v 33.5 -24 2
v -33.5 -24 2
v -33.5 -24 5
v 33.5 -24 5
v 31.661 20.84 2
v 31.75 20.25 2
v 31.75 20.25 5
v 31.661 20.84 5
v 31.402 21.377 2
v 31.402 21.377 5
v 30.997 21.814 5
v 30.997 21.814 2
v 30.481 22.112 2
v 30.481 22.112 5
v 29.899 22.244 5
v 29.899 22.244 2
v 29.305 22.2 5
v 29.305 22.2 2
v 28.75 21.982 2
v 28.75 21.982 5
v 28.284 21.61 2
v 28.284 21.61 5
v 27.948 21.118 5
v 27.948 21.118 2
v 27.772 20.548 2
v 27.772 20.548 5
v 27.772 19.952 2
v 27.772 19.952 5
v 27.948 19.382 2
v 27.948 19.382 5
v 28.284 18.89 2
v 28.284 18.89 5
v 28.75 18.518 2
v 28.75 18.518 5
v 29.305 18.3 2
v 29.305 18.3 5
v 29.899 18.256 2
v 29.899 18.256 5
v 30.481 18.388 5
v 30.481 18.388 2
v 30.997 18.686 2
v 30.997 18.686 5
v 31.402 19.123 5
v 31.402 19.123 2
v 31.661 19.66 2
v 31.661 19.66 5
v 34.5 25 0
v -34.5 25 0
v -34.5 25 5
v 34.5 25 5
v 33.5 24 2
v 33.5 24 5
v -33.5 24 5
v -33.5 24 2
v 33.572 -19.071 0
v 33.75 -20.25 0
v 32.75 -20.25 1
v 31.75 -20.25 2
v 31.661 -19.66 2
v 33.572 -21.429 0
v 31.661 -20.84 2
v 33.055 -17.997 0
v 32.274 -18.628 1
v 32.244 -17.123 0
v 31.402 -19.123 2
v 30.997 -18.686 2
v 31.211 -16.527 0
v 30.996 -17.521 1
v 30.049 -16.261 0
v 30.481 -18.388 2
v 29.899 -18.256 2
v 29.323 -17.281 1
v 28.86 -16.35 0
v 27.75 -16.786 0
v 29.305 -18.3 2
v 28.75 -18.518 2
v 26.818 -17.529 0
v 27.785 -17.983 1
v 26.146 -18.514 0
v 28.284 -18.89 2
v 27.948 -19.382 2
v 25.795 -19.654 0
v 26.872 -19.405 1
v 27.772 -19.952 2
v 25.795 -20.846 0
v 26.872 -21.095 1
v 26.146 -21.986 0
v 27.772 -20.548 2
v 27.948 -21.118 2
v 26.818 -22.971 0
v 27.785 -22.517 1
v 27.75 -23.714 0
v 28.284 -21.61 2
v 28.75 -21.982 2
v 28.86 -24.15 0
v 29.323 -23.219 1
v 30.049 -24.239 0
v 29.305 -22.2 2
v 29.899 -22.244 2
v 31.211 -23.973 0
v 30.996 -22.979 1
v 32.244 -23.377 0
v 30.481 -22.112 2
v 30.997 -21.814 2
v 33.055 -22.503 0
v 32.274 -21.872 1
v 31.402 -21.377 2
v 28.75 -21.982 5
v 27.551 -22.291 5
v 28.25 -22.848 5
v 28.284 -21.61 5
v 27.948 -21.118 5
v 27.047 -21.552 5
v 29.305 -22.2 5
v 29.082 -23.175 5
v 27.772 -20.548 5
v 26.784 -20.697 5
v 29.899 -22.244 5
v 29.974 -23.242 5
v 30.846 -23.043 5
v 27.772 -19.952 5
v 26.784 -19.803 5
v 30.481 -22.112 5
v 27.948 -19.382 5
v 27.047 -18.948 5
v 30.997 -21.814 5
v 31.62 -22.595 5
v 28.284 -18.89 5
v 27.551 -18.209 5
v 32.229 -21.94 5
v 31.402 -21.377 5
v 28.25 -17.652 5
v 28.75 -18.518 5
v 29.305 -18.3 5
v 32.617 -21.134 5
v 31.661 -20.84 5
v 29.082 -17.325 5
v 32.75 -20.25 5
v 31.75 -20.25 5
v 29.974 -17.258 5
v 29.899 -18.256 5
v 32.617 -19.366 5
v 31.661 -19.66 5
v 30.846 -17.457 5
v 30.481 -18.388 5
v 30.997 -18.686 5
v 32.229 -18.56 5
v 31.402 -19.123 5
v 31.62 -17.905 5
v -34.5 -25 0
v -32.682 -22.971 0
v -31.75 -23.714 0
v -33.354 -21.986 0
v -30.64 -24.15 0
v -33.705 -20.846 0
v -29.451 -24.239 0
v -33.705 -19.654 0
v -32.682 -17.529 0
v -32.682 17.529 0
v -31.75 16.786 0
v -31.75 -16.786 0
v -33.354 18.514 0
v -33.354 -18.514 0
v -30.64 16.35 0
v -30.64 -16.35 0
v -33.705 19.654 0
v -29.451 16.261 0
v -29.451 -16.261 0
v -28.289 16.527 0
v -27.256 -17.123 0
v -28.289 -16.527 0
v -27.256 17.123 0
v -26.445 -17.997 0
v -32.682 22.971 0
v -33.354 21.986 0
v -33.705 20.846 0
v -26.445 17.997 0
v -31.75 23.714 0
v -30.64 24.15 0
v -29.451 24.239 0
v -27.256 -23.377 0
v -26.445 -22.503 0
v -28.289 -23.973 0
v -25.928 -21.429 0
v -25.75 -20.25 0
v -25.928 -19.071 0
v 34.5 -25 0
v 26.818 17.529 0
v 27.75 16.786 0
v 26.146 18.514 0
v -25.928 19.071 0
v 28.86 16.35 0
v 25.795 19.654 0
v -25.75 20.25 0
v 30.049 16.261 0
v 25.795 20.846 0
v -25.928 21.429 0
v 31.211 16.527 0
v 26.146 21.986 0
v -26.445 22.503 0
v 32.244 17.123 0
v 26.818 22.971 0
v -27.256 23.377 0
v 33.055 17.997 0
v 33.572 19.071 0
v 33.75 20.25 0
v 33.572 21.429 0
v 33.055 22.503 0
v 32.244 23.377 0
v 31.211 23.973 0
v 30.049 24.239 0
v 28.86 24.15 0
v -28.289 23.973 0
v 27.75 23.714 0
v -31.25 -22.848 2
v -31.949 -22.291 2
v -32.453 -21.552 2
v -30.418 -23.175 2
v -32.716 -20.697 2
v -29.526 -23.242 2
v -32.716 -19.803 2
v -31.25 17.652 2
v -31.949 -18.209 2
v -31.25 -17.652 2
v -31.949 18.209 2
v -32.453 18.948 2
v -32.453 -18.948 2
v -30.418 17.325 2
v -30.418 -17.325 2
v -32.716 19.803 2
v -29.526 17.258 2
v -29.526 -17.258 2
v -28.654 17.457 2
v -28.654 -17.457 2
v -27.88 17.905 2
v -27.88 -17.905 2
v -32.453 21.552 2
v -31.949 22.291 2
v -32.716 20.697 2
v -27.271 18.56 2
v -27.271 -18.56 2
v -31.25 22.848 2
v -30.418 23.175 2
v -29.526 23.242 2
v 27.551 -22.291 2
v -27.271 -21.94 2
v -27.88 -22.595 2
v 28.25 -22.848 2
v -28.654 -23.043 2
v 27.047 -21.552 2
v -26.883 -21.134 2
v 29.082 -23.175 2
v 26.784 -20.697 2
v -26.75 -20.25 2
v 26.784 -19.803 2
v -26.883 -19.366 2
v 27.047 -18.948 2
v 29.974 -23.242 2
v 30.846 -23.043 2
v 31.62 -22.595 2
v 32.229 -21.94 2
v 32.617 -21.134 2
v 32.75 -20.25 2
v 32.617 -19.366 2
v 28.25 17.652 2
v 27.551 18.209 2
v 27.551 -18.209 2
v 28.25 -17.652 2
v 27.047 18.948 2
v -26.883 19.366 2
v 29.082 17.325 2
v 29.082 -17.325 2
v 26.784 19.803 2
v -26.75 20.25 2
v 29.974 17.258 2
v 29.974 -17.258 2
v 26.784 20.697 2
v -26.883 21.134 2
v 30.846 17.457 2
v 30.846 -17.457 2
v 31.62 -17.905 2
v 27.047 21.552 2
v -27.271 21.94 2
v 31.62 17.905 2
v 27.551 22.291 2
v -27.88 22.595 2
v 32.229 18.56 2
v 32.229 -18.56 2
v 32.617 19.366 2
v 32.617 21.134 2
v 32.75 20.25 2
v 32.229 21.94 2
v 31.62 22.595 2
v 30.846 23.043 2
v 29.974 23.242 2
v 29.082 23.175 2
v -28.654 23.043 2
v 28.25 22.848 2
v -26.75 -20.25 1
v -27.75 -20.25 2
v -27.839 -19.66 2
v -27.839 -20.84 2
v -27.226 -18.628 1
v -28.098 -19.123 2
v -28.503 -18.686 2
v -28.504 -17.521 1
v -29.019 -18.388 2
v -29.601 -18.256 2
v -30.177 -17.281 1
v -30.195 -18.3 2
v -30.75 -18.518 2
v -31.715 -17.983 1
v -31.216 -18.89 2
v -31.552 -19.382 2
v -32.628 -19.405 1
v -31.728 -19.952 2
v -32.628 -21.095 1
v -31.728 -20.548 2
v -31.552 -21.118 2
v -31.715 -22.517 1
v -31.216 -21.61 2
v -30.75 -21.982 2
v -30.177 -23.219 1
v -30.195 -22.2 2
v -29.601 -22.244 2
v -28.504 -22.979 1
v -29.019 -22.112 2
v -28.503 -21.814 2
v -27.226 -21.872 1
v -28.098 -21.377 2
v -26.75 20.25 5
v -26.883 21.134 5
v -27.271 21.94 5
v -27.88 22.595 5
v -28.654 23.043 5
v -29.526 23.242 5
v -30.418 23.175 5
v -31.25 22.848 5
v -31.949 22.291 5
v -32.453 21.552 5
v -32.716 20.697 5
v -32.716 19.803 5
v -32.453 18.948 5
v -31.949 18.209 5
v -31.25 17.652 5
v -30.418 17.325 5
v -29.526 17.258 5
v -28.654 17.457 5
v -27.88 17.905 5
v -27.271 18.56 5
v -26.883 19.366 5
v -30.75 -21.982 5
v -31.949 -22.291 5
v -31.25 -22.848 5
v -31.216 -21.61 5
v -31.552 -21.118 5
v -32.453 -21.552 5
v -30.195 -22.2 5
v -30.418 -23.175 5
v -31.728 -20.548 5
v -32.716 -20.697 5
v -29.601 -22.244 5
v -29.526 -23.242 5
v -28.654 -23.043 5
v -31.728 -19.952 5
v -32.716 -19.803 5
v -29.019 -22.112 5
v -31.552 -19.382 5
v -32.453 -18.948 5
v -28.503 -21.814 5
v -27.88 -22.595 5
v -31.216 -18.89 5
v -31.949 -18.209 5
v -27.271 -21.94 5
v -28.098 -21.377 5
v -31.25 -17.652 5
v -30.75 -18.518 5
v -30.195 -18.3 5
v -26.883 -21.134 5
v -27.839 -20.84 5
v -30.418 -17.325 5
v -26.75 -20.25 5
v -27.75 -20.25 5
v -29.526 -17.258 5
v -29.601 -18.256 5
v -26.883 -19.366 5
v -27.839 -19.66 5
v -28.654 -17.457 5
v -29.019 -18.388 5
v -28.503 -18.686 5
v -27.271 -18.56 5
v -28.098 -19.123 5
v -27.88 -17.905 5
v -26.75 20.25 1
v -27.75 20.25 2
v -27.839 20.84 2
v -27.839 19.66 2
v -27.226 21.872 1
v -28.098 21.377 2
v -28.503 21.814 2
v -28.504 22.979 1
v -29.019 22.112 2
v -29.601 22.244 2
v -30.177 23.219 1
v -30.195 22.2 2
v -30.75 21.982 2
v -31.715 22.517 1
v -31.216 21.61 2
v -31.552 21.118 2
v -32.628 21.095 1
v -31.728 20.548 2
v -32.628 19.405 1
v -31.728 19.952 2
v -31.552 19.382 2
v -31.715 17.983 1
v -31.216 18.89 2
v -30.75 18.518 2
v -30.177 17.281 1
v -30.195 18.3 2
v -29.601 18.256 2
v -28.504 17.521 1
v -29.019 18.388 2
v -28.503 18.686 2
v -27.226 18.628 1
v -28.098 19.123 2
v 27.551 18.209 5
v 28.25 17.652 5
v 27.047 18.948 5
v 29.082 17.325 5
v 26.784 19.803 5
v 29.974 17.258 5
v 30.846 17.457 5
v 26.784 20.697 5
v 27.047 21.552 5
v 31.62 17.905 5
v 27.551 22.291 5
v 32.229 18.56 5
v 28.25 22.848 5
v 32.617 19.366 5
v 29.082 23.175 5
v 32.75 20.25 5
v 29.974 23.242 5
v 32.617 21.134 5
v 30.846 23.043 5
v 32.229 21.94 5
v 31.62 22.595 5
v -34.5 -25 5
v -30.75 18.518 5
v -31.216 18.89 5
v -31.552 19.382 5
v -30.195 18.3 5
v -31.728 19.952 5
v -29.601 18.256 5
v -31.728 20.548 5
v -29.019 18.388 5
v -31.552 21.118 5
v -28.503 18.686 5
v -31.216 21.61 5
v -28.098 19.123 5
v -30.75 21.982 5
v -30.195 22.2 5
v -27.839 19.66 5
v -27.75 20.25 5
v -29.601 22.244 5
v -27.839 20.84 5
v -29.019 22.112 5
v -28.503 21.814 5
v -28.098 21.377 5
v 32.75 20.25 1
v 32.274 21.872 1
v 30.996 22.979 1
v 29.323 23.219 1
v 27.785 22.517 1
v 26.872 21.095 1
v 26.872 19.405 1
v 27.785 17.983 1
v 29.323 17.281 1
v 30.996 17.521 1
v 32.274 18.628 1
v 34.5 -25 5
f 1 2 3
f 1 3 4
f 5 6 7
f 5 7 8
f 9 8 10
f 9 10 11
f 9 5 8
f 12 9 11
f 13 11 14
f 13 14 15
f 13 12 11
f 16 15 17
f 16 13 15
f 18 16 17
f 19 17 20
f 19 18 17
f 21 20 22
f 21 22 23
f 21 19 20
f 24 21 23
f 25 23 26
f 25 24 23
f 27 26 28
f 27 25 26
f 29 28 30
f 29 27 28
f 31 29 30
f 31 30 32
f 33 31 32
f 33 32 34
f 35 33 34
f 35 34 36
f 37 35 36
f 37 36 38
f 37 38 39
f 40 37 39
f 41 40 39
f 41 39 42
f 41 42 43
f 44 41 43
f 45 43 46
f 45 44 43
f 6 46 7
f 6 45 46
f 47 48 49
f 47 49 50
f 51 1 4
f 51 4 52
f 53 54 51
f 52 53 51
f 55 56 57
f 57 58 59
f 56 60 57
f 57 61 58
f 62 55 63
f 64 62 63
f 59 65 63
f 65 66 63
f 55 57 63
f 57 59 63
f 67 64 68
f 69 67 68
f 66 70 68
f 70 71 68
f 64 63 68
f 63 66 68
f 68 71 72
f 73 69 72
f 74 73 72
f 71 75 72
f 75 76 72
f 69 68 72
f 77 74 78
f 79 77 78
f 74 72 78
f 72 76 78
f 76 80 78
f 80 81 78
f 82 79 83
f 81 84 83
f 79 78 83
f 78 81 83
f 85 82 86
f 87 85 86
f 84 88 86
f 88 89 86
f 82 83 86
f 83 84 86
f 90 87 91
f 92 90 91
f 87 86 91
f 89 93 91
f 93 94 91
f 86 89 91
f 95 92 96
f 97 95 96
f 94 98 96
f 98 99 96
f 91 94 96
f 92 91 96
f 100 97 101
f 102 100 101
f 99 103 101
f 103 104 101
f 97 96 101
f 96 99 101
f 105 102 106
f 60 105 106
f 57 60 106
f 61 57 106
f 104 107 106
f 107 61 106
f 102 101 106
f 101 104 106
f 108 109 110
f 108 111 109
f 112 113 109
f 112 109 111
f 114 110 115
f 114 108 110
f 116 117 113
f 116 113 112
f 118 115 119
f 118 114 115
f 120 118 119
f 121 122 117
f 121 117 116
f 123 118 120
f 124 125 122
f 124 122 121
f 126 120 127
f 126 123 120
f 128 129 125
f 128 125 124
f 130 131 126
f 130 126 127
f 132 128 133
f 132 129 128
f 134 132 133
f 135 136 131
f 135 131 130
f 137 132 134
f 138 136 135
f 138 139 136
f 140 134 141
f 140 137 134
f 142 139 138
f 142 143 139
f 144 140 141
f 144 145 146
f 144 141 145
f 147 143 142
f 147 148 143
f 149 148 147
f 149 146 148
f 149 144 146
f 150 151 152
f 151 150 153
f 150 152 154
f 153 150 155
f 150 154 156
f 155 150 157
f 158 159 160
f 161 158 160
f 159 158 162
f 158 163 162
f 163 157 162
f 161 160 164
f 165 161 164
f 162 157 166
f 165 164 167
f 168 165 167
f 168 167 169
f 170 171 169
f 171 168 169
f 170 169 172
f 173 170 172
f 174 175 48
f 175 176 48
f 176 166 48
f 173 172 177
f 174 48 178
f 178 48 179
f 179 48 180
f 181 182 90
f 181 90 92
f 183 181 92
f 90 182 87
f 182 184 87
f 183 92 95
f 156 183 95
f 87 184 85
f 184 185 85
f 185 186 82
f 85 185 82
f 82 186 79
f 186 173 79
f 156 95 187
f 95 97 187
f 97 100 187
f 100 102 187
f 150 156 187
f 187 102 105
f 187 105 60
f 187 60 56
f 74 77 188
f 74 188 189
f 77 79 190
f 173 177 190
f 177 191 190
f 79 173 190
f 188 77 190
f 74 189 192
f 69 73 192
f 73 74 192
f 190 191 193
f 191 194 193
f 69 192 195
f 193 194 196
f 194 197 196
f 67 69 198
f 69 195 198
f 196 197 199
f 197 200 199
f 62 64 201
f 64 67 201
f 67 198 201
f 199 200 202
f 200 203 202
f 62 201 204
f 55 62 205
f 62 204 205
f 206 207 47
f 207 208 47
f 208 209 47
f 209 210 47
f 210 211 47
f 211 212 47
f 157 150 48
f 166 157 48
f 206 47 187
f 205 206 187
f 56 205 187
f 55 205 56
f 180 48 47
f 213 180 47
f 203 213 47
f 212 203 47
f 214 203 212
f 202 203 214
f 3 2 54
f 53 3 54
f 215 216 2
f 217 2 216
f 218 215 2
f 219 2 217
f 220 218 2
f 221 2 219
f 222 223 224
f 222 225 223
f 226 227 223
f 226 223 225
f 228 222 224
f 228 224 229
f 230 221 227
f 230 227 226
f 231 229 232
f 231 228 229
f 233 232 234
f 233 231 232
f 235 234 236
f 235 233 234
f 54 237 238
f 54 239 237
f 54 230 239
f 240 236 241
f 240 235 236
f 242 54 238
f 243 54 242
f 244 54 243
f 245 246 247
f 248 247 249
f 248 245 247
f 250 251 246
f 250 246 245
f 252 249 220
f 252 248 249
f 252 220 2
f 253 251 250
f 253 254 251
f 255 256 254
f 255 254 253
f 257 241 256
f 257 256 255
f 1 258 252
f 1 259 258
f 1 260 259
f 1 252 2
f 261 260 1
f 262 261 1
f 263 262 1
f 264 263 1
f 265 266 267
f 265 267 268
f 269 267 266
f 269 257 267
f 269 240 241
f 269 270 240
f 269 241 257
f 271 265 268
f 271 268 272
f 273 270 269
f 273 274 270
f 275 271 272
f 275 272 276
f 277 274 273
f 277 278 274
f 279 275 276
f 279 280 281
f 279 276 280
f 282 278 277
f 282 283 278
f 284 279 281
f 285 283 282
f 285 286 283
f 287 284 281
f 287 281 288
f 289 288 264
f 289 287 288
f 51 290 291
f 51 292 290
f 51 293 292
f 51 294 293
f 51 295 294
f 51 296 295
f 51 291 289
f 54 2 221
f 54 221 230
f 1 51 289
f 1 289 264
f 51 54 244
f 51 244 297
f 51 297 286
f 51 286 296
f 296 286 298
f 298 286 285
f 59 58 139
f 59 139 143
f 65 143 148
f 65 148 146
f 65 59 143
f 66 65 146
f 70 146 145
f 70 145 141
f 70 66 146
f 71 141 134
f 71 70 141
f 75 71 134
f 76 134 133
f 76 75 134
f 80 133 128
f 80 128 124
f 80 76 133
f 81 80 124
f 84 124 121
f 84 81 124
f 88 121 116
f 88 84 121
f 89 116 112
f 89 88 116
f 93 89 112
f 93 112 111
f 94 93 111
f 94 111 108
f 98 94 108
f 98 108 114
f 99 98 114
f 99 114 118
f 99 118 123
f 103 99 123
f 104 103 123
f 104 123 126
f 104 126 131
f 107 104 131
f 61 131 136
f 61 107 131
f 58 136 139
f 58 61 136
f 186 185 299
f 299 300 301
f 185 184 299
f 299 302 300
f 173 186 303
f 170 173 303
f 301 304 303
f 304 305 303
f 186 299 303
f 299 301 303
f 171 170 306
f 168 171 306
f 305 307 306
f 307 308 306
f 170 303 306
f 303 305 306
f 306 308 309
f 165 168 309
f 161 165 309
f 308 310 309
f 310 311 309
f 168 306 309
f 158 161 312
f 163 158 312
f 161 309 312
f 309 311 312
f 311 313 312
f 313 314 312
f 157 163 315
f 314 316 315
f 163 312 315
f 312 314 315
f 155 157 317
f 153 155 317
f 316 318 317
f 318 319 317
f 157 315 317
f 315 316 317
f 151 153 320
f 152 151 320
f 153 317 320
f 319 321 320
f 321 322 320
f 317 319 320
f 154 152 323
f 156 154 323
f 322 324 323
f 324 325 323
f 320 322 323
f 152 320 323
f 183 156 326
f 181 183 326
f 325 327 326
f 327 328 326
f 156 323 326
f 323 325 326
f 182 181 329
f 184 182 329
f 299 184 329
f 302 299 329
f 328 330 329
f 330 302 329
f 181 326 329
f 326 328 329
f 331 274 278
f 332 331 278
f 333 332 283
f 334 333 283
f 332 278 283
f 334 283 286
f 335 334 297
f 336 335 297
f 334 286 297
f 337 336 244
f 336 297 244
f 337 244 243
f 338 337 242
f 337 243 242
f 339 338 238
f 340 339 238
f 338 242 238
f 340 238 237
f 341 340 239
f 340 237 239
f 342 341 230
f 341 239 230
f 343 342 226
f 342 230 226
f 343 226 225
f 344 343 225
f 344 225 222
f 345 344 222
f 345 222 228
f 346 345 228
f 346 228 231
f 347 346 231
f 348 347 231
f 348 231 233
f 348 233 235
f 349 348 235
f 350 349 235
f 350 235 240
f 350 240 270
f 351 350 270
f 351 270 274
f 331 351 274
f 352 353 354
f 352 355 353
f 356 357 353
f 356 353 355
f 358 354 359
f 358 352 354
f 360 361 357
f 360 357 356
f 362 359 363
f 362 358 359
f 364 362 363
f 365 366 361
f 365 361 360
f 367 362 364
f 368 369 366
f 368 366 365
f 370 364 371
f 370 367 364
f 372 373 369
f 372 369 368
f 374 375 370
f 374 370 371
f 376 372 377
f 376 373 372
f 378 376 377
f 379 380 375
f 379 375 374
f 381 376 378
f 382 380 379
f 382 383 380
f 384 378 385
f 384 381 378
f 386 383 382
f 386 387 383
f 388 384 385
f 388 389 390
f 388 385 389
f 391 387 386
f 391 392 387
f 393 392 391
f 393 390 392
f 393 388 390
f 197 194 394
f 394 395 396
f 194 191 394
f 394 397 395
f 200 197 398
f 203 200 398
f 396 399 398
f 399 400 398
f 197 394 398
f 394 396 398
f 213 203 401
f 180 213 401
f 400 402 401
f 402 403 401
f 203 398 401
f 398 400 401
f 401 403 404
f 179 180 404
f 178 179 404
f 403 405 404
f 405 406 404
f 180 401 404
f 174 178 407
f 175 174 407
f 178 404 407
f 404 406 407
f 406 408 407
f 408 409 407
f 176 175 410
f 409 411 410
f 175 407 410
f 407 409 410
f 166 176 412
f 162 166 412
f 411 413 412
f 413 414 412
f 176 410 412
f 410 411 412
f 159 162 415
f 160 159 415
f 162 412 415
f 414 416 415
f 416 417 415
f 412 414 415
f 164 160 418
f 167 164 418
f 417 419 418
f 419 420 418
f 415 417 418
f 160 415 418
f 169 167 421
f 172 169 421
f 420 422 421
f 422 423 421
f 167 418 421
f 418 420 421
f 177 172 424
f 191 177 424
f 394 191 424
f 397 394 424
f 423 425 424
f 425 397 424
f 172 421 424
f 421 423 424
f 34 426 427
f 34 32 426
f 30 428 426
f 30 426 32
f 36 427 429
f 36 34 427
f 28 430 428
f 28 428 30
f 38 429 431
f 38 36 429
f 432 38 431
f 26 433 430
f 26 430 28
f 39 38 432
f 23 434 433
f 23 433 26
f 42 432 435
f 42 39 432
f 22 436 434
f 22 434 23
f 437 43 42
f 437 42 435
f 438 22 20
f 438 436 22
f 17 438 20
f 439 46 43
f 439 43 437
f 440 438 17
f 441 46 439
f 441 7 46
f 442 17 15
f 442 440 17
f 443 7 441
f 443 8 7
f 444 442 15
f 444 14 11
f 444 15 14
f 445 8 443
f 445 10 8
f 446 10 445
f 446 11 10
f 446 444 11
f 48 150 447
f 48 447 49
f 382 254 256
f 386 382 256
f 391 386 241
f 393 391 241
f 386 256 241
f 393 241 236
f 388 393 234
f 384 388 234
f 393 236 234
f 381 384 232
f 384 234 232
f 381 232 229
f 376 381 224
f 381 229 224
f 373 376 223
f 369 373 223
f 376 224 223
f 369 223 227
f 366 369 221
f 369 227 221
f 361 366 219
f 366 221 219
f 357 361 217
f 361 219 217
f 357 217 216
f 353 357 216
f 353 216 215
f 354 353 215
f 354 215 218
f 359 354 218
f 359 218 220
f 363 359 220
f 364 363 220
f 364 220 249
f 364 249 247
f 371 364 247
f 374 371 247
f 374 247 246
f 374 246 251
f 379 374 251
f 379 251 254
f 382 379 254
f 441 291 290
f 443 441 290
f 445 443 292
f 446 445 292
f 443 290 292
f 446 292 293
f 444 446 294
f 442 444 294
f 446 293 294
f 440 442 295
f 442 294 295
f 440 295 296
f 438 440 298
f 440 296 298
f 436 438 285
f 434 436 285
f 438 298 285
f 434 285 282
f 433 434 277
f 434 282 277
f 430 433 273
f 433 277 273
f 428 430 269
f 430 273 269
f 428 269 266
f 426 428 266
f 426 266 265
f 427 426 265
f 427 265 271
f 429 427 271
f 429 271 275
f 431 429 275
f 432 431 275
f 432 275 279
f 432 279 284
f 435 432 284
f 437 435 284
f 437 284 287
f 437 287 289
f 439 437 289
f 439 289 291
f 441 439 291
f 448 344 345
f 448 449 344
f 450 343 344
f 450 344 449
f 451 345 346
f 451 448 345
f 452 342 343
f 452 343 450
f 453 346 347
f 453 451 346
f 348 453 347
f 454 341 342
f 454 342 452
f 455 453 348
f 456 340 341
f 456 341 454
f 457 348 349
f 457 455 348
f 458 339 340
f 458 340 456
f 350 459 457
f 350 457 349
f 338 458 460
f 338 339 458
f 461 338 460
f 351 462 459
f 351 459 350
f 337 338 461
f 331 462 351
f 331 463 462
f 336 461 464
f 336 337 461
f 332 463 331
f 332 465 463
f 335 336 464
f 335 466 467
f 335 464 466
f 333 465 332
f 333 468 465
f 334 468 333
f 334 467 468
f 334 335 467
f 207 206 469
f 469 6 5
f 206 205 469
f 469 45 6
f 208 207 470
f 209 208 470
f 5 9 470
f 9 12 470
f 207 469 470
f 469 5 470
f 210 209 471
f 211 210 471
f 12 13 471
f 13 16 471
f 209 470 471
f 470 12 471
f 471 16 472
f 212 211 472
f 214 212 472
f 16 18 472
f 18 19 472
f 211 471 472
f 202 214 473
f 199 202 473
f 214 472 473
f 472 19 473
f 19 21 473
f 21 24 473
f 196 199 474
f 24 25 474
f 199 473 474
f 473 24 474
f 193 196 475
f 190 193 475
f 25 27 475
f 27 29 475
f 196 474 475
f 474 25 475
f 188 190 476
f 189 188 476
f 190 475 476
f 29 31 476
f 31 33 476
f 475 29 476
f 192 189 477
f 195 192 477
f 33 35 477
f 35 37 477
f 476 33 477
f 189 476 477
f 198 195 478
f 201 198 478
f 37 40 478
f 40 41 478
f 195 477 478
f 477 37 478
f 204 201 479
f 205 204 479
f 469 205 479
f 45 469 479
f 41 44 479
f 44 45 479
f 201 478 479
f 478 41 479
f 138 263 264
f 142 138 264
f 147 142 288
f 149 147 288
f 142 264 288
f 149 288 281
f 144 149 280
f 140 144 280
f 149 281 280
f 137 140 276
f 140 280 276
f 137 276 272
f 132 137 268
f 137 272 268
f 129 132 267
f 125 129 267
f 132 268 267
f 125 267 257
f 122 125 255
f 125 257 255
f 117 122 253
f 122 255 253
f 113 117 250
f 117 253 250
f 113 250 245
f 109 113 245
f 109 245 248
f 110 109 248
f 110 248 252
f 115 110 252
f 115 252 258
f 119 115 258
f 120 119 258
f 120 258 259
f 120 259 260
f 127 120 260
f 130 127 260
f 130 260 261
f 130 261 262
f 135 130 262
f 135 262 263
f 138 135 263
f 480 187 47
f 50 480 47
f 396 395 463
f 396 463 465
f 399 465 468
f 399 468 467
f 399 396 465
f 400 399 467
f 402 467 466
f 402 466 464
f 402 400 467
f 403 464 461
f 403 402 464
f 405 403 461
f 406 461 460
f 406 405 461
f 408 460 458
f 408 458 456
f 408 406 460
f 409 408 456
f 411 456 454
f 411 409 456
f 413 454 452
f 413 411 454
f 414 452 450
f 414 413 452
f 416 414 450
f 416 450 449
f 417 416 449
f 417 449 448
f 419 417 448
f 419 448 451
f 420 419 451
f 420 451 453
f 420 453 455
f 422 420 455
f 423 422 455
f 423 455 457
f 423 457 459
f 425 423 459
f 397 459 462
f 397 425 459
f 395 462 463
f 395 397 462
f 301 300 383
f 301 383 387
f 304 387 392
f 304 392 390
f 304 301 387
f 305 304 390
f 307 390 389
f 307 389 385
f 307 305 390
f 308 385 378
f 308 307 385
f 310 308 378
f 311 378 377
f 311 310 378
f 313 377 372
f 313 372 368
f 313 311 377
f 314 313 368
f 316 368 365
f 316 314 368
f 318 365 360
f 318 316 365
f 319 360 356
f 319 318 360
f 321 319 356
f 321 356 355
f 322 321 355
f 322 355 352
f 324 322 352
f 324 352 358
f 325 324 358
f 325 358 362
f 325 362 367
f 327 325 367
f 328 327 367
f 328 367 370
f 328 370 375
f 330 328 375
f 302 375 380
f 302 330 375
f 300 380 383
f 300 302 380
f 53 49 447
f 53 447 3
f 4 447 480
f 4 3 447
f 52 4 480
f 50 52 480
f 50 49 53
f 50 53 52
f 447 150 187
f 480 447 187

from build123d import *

# Parameters (mm, degrees)
F0_W     = 67
F0_H     = 48
F0_R     = 3
F1_DEPTH = 2
F0_R_2   = 2
F2_DEPTH = 5
F0_W_2   = 69
F0_H_2   = 50
F3_DEPTH = 5
F4_SIZE  = 2


with BuildPart() as f1:
    # F0 (on Top) → F1 (new body)
    with BuildSketch(Plane.XY):
        Rectangle(F0_W, F0_H)
        with Locations((-29.75, -20.25)):
            Circle(F0_R, mode=Mode.SUBTRACT)
        with Locations((29.75, -20.25)):
            Circle(F0_R, mode=Mode.SUBTRACT)
        with Locations((-29.75, 20.25)):
            Circle(F0_R, mode=Mode.SUBTRACT)
        with Locations((29.75, 20.25)):
            Circle(F0_R, mode=Mode.SUBTRACT)
    extrude(amount=F1_DEPTH)

    # F0 (on Top) → F2 (join)
    with BuildSketch(Plane.XY):
        with Locations((-29.75, 20.25)):
            Circle(F0_R)
        with Locations((-29.75, 20.25)):
            Circle(F0_R_2, mode=Mode.SUBTRACT)
        with Locations((29.75, 20.25)):
            Circle(F0_R)
        with Locations((29.75, 20.25)):
            Circle(F0_R_2, mode=Mode.SUBTRACT)
        with Locations((29.75, -20.25)):
            Circle(F0_R)
        with Locations((29.75, -20.25)):
            Circle(F0_R_2, mode=Mode.SUBTRACT)
        with Locations((-29.75, -20.25)):
            Circle(F0_R)
        with Locations((-29.75, -20.25)):
            Circle(F0_R_2, mode=Mode.SUBTRACT)
    extrude(amount=F2_DEPTH)

    # F0 (on Top) → F3 (join)
    with BuildSketch(Plane.XY):
        Rectangle(F0_W_2, F0_H_2)
        Rectangle(F0_W, F0_H, mode=Mode.SUBTRACT)
    extrude(amount=F3_DEPTH)

    # F4
    f4_edges = [f1.edges().sort_by_distance(p)[0] for p in [
        (27.75, -20.25, 0),
        (27.75, 20.25, 0),
        (-31.75, 20.25, 0),
        (-31.75, -20.25, 0),
    ]]
    chamfer(f4_edges, length=F4_SIZE)


solid = f1.part
